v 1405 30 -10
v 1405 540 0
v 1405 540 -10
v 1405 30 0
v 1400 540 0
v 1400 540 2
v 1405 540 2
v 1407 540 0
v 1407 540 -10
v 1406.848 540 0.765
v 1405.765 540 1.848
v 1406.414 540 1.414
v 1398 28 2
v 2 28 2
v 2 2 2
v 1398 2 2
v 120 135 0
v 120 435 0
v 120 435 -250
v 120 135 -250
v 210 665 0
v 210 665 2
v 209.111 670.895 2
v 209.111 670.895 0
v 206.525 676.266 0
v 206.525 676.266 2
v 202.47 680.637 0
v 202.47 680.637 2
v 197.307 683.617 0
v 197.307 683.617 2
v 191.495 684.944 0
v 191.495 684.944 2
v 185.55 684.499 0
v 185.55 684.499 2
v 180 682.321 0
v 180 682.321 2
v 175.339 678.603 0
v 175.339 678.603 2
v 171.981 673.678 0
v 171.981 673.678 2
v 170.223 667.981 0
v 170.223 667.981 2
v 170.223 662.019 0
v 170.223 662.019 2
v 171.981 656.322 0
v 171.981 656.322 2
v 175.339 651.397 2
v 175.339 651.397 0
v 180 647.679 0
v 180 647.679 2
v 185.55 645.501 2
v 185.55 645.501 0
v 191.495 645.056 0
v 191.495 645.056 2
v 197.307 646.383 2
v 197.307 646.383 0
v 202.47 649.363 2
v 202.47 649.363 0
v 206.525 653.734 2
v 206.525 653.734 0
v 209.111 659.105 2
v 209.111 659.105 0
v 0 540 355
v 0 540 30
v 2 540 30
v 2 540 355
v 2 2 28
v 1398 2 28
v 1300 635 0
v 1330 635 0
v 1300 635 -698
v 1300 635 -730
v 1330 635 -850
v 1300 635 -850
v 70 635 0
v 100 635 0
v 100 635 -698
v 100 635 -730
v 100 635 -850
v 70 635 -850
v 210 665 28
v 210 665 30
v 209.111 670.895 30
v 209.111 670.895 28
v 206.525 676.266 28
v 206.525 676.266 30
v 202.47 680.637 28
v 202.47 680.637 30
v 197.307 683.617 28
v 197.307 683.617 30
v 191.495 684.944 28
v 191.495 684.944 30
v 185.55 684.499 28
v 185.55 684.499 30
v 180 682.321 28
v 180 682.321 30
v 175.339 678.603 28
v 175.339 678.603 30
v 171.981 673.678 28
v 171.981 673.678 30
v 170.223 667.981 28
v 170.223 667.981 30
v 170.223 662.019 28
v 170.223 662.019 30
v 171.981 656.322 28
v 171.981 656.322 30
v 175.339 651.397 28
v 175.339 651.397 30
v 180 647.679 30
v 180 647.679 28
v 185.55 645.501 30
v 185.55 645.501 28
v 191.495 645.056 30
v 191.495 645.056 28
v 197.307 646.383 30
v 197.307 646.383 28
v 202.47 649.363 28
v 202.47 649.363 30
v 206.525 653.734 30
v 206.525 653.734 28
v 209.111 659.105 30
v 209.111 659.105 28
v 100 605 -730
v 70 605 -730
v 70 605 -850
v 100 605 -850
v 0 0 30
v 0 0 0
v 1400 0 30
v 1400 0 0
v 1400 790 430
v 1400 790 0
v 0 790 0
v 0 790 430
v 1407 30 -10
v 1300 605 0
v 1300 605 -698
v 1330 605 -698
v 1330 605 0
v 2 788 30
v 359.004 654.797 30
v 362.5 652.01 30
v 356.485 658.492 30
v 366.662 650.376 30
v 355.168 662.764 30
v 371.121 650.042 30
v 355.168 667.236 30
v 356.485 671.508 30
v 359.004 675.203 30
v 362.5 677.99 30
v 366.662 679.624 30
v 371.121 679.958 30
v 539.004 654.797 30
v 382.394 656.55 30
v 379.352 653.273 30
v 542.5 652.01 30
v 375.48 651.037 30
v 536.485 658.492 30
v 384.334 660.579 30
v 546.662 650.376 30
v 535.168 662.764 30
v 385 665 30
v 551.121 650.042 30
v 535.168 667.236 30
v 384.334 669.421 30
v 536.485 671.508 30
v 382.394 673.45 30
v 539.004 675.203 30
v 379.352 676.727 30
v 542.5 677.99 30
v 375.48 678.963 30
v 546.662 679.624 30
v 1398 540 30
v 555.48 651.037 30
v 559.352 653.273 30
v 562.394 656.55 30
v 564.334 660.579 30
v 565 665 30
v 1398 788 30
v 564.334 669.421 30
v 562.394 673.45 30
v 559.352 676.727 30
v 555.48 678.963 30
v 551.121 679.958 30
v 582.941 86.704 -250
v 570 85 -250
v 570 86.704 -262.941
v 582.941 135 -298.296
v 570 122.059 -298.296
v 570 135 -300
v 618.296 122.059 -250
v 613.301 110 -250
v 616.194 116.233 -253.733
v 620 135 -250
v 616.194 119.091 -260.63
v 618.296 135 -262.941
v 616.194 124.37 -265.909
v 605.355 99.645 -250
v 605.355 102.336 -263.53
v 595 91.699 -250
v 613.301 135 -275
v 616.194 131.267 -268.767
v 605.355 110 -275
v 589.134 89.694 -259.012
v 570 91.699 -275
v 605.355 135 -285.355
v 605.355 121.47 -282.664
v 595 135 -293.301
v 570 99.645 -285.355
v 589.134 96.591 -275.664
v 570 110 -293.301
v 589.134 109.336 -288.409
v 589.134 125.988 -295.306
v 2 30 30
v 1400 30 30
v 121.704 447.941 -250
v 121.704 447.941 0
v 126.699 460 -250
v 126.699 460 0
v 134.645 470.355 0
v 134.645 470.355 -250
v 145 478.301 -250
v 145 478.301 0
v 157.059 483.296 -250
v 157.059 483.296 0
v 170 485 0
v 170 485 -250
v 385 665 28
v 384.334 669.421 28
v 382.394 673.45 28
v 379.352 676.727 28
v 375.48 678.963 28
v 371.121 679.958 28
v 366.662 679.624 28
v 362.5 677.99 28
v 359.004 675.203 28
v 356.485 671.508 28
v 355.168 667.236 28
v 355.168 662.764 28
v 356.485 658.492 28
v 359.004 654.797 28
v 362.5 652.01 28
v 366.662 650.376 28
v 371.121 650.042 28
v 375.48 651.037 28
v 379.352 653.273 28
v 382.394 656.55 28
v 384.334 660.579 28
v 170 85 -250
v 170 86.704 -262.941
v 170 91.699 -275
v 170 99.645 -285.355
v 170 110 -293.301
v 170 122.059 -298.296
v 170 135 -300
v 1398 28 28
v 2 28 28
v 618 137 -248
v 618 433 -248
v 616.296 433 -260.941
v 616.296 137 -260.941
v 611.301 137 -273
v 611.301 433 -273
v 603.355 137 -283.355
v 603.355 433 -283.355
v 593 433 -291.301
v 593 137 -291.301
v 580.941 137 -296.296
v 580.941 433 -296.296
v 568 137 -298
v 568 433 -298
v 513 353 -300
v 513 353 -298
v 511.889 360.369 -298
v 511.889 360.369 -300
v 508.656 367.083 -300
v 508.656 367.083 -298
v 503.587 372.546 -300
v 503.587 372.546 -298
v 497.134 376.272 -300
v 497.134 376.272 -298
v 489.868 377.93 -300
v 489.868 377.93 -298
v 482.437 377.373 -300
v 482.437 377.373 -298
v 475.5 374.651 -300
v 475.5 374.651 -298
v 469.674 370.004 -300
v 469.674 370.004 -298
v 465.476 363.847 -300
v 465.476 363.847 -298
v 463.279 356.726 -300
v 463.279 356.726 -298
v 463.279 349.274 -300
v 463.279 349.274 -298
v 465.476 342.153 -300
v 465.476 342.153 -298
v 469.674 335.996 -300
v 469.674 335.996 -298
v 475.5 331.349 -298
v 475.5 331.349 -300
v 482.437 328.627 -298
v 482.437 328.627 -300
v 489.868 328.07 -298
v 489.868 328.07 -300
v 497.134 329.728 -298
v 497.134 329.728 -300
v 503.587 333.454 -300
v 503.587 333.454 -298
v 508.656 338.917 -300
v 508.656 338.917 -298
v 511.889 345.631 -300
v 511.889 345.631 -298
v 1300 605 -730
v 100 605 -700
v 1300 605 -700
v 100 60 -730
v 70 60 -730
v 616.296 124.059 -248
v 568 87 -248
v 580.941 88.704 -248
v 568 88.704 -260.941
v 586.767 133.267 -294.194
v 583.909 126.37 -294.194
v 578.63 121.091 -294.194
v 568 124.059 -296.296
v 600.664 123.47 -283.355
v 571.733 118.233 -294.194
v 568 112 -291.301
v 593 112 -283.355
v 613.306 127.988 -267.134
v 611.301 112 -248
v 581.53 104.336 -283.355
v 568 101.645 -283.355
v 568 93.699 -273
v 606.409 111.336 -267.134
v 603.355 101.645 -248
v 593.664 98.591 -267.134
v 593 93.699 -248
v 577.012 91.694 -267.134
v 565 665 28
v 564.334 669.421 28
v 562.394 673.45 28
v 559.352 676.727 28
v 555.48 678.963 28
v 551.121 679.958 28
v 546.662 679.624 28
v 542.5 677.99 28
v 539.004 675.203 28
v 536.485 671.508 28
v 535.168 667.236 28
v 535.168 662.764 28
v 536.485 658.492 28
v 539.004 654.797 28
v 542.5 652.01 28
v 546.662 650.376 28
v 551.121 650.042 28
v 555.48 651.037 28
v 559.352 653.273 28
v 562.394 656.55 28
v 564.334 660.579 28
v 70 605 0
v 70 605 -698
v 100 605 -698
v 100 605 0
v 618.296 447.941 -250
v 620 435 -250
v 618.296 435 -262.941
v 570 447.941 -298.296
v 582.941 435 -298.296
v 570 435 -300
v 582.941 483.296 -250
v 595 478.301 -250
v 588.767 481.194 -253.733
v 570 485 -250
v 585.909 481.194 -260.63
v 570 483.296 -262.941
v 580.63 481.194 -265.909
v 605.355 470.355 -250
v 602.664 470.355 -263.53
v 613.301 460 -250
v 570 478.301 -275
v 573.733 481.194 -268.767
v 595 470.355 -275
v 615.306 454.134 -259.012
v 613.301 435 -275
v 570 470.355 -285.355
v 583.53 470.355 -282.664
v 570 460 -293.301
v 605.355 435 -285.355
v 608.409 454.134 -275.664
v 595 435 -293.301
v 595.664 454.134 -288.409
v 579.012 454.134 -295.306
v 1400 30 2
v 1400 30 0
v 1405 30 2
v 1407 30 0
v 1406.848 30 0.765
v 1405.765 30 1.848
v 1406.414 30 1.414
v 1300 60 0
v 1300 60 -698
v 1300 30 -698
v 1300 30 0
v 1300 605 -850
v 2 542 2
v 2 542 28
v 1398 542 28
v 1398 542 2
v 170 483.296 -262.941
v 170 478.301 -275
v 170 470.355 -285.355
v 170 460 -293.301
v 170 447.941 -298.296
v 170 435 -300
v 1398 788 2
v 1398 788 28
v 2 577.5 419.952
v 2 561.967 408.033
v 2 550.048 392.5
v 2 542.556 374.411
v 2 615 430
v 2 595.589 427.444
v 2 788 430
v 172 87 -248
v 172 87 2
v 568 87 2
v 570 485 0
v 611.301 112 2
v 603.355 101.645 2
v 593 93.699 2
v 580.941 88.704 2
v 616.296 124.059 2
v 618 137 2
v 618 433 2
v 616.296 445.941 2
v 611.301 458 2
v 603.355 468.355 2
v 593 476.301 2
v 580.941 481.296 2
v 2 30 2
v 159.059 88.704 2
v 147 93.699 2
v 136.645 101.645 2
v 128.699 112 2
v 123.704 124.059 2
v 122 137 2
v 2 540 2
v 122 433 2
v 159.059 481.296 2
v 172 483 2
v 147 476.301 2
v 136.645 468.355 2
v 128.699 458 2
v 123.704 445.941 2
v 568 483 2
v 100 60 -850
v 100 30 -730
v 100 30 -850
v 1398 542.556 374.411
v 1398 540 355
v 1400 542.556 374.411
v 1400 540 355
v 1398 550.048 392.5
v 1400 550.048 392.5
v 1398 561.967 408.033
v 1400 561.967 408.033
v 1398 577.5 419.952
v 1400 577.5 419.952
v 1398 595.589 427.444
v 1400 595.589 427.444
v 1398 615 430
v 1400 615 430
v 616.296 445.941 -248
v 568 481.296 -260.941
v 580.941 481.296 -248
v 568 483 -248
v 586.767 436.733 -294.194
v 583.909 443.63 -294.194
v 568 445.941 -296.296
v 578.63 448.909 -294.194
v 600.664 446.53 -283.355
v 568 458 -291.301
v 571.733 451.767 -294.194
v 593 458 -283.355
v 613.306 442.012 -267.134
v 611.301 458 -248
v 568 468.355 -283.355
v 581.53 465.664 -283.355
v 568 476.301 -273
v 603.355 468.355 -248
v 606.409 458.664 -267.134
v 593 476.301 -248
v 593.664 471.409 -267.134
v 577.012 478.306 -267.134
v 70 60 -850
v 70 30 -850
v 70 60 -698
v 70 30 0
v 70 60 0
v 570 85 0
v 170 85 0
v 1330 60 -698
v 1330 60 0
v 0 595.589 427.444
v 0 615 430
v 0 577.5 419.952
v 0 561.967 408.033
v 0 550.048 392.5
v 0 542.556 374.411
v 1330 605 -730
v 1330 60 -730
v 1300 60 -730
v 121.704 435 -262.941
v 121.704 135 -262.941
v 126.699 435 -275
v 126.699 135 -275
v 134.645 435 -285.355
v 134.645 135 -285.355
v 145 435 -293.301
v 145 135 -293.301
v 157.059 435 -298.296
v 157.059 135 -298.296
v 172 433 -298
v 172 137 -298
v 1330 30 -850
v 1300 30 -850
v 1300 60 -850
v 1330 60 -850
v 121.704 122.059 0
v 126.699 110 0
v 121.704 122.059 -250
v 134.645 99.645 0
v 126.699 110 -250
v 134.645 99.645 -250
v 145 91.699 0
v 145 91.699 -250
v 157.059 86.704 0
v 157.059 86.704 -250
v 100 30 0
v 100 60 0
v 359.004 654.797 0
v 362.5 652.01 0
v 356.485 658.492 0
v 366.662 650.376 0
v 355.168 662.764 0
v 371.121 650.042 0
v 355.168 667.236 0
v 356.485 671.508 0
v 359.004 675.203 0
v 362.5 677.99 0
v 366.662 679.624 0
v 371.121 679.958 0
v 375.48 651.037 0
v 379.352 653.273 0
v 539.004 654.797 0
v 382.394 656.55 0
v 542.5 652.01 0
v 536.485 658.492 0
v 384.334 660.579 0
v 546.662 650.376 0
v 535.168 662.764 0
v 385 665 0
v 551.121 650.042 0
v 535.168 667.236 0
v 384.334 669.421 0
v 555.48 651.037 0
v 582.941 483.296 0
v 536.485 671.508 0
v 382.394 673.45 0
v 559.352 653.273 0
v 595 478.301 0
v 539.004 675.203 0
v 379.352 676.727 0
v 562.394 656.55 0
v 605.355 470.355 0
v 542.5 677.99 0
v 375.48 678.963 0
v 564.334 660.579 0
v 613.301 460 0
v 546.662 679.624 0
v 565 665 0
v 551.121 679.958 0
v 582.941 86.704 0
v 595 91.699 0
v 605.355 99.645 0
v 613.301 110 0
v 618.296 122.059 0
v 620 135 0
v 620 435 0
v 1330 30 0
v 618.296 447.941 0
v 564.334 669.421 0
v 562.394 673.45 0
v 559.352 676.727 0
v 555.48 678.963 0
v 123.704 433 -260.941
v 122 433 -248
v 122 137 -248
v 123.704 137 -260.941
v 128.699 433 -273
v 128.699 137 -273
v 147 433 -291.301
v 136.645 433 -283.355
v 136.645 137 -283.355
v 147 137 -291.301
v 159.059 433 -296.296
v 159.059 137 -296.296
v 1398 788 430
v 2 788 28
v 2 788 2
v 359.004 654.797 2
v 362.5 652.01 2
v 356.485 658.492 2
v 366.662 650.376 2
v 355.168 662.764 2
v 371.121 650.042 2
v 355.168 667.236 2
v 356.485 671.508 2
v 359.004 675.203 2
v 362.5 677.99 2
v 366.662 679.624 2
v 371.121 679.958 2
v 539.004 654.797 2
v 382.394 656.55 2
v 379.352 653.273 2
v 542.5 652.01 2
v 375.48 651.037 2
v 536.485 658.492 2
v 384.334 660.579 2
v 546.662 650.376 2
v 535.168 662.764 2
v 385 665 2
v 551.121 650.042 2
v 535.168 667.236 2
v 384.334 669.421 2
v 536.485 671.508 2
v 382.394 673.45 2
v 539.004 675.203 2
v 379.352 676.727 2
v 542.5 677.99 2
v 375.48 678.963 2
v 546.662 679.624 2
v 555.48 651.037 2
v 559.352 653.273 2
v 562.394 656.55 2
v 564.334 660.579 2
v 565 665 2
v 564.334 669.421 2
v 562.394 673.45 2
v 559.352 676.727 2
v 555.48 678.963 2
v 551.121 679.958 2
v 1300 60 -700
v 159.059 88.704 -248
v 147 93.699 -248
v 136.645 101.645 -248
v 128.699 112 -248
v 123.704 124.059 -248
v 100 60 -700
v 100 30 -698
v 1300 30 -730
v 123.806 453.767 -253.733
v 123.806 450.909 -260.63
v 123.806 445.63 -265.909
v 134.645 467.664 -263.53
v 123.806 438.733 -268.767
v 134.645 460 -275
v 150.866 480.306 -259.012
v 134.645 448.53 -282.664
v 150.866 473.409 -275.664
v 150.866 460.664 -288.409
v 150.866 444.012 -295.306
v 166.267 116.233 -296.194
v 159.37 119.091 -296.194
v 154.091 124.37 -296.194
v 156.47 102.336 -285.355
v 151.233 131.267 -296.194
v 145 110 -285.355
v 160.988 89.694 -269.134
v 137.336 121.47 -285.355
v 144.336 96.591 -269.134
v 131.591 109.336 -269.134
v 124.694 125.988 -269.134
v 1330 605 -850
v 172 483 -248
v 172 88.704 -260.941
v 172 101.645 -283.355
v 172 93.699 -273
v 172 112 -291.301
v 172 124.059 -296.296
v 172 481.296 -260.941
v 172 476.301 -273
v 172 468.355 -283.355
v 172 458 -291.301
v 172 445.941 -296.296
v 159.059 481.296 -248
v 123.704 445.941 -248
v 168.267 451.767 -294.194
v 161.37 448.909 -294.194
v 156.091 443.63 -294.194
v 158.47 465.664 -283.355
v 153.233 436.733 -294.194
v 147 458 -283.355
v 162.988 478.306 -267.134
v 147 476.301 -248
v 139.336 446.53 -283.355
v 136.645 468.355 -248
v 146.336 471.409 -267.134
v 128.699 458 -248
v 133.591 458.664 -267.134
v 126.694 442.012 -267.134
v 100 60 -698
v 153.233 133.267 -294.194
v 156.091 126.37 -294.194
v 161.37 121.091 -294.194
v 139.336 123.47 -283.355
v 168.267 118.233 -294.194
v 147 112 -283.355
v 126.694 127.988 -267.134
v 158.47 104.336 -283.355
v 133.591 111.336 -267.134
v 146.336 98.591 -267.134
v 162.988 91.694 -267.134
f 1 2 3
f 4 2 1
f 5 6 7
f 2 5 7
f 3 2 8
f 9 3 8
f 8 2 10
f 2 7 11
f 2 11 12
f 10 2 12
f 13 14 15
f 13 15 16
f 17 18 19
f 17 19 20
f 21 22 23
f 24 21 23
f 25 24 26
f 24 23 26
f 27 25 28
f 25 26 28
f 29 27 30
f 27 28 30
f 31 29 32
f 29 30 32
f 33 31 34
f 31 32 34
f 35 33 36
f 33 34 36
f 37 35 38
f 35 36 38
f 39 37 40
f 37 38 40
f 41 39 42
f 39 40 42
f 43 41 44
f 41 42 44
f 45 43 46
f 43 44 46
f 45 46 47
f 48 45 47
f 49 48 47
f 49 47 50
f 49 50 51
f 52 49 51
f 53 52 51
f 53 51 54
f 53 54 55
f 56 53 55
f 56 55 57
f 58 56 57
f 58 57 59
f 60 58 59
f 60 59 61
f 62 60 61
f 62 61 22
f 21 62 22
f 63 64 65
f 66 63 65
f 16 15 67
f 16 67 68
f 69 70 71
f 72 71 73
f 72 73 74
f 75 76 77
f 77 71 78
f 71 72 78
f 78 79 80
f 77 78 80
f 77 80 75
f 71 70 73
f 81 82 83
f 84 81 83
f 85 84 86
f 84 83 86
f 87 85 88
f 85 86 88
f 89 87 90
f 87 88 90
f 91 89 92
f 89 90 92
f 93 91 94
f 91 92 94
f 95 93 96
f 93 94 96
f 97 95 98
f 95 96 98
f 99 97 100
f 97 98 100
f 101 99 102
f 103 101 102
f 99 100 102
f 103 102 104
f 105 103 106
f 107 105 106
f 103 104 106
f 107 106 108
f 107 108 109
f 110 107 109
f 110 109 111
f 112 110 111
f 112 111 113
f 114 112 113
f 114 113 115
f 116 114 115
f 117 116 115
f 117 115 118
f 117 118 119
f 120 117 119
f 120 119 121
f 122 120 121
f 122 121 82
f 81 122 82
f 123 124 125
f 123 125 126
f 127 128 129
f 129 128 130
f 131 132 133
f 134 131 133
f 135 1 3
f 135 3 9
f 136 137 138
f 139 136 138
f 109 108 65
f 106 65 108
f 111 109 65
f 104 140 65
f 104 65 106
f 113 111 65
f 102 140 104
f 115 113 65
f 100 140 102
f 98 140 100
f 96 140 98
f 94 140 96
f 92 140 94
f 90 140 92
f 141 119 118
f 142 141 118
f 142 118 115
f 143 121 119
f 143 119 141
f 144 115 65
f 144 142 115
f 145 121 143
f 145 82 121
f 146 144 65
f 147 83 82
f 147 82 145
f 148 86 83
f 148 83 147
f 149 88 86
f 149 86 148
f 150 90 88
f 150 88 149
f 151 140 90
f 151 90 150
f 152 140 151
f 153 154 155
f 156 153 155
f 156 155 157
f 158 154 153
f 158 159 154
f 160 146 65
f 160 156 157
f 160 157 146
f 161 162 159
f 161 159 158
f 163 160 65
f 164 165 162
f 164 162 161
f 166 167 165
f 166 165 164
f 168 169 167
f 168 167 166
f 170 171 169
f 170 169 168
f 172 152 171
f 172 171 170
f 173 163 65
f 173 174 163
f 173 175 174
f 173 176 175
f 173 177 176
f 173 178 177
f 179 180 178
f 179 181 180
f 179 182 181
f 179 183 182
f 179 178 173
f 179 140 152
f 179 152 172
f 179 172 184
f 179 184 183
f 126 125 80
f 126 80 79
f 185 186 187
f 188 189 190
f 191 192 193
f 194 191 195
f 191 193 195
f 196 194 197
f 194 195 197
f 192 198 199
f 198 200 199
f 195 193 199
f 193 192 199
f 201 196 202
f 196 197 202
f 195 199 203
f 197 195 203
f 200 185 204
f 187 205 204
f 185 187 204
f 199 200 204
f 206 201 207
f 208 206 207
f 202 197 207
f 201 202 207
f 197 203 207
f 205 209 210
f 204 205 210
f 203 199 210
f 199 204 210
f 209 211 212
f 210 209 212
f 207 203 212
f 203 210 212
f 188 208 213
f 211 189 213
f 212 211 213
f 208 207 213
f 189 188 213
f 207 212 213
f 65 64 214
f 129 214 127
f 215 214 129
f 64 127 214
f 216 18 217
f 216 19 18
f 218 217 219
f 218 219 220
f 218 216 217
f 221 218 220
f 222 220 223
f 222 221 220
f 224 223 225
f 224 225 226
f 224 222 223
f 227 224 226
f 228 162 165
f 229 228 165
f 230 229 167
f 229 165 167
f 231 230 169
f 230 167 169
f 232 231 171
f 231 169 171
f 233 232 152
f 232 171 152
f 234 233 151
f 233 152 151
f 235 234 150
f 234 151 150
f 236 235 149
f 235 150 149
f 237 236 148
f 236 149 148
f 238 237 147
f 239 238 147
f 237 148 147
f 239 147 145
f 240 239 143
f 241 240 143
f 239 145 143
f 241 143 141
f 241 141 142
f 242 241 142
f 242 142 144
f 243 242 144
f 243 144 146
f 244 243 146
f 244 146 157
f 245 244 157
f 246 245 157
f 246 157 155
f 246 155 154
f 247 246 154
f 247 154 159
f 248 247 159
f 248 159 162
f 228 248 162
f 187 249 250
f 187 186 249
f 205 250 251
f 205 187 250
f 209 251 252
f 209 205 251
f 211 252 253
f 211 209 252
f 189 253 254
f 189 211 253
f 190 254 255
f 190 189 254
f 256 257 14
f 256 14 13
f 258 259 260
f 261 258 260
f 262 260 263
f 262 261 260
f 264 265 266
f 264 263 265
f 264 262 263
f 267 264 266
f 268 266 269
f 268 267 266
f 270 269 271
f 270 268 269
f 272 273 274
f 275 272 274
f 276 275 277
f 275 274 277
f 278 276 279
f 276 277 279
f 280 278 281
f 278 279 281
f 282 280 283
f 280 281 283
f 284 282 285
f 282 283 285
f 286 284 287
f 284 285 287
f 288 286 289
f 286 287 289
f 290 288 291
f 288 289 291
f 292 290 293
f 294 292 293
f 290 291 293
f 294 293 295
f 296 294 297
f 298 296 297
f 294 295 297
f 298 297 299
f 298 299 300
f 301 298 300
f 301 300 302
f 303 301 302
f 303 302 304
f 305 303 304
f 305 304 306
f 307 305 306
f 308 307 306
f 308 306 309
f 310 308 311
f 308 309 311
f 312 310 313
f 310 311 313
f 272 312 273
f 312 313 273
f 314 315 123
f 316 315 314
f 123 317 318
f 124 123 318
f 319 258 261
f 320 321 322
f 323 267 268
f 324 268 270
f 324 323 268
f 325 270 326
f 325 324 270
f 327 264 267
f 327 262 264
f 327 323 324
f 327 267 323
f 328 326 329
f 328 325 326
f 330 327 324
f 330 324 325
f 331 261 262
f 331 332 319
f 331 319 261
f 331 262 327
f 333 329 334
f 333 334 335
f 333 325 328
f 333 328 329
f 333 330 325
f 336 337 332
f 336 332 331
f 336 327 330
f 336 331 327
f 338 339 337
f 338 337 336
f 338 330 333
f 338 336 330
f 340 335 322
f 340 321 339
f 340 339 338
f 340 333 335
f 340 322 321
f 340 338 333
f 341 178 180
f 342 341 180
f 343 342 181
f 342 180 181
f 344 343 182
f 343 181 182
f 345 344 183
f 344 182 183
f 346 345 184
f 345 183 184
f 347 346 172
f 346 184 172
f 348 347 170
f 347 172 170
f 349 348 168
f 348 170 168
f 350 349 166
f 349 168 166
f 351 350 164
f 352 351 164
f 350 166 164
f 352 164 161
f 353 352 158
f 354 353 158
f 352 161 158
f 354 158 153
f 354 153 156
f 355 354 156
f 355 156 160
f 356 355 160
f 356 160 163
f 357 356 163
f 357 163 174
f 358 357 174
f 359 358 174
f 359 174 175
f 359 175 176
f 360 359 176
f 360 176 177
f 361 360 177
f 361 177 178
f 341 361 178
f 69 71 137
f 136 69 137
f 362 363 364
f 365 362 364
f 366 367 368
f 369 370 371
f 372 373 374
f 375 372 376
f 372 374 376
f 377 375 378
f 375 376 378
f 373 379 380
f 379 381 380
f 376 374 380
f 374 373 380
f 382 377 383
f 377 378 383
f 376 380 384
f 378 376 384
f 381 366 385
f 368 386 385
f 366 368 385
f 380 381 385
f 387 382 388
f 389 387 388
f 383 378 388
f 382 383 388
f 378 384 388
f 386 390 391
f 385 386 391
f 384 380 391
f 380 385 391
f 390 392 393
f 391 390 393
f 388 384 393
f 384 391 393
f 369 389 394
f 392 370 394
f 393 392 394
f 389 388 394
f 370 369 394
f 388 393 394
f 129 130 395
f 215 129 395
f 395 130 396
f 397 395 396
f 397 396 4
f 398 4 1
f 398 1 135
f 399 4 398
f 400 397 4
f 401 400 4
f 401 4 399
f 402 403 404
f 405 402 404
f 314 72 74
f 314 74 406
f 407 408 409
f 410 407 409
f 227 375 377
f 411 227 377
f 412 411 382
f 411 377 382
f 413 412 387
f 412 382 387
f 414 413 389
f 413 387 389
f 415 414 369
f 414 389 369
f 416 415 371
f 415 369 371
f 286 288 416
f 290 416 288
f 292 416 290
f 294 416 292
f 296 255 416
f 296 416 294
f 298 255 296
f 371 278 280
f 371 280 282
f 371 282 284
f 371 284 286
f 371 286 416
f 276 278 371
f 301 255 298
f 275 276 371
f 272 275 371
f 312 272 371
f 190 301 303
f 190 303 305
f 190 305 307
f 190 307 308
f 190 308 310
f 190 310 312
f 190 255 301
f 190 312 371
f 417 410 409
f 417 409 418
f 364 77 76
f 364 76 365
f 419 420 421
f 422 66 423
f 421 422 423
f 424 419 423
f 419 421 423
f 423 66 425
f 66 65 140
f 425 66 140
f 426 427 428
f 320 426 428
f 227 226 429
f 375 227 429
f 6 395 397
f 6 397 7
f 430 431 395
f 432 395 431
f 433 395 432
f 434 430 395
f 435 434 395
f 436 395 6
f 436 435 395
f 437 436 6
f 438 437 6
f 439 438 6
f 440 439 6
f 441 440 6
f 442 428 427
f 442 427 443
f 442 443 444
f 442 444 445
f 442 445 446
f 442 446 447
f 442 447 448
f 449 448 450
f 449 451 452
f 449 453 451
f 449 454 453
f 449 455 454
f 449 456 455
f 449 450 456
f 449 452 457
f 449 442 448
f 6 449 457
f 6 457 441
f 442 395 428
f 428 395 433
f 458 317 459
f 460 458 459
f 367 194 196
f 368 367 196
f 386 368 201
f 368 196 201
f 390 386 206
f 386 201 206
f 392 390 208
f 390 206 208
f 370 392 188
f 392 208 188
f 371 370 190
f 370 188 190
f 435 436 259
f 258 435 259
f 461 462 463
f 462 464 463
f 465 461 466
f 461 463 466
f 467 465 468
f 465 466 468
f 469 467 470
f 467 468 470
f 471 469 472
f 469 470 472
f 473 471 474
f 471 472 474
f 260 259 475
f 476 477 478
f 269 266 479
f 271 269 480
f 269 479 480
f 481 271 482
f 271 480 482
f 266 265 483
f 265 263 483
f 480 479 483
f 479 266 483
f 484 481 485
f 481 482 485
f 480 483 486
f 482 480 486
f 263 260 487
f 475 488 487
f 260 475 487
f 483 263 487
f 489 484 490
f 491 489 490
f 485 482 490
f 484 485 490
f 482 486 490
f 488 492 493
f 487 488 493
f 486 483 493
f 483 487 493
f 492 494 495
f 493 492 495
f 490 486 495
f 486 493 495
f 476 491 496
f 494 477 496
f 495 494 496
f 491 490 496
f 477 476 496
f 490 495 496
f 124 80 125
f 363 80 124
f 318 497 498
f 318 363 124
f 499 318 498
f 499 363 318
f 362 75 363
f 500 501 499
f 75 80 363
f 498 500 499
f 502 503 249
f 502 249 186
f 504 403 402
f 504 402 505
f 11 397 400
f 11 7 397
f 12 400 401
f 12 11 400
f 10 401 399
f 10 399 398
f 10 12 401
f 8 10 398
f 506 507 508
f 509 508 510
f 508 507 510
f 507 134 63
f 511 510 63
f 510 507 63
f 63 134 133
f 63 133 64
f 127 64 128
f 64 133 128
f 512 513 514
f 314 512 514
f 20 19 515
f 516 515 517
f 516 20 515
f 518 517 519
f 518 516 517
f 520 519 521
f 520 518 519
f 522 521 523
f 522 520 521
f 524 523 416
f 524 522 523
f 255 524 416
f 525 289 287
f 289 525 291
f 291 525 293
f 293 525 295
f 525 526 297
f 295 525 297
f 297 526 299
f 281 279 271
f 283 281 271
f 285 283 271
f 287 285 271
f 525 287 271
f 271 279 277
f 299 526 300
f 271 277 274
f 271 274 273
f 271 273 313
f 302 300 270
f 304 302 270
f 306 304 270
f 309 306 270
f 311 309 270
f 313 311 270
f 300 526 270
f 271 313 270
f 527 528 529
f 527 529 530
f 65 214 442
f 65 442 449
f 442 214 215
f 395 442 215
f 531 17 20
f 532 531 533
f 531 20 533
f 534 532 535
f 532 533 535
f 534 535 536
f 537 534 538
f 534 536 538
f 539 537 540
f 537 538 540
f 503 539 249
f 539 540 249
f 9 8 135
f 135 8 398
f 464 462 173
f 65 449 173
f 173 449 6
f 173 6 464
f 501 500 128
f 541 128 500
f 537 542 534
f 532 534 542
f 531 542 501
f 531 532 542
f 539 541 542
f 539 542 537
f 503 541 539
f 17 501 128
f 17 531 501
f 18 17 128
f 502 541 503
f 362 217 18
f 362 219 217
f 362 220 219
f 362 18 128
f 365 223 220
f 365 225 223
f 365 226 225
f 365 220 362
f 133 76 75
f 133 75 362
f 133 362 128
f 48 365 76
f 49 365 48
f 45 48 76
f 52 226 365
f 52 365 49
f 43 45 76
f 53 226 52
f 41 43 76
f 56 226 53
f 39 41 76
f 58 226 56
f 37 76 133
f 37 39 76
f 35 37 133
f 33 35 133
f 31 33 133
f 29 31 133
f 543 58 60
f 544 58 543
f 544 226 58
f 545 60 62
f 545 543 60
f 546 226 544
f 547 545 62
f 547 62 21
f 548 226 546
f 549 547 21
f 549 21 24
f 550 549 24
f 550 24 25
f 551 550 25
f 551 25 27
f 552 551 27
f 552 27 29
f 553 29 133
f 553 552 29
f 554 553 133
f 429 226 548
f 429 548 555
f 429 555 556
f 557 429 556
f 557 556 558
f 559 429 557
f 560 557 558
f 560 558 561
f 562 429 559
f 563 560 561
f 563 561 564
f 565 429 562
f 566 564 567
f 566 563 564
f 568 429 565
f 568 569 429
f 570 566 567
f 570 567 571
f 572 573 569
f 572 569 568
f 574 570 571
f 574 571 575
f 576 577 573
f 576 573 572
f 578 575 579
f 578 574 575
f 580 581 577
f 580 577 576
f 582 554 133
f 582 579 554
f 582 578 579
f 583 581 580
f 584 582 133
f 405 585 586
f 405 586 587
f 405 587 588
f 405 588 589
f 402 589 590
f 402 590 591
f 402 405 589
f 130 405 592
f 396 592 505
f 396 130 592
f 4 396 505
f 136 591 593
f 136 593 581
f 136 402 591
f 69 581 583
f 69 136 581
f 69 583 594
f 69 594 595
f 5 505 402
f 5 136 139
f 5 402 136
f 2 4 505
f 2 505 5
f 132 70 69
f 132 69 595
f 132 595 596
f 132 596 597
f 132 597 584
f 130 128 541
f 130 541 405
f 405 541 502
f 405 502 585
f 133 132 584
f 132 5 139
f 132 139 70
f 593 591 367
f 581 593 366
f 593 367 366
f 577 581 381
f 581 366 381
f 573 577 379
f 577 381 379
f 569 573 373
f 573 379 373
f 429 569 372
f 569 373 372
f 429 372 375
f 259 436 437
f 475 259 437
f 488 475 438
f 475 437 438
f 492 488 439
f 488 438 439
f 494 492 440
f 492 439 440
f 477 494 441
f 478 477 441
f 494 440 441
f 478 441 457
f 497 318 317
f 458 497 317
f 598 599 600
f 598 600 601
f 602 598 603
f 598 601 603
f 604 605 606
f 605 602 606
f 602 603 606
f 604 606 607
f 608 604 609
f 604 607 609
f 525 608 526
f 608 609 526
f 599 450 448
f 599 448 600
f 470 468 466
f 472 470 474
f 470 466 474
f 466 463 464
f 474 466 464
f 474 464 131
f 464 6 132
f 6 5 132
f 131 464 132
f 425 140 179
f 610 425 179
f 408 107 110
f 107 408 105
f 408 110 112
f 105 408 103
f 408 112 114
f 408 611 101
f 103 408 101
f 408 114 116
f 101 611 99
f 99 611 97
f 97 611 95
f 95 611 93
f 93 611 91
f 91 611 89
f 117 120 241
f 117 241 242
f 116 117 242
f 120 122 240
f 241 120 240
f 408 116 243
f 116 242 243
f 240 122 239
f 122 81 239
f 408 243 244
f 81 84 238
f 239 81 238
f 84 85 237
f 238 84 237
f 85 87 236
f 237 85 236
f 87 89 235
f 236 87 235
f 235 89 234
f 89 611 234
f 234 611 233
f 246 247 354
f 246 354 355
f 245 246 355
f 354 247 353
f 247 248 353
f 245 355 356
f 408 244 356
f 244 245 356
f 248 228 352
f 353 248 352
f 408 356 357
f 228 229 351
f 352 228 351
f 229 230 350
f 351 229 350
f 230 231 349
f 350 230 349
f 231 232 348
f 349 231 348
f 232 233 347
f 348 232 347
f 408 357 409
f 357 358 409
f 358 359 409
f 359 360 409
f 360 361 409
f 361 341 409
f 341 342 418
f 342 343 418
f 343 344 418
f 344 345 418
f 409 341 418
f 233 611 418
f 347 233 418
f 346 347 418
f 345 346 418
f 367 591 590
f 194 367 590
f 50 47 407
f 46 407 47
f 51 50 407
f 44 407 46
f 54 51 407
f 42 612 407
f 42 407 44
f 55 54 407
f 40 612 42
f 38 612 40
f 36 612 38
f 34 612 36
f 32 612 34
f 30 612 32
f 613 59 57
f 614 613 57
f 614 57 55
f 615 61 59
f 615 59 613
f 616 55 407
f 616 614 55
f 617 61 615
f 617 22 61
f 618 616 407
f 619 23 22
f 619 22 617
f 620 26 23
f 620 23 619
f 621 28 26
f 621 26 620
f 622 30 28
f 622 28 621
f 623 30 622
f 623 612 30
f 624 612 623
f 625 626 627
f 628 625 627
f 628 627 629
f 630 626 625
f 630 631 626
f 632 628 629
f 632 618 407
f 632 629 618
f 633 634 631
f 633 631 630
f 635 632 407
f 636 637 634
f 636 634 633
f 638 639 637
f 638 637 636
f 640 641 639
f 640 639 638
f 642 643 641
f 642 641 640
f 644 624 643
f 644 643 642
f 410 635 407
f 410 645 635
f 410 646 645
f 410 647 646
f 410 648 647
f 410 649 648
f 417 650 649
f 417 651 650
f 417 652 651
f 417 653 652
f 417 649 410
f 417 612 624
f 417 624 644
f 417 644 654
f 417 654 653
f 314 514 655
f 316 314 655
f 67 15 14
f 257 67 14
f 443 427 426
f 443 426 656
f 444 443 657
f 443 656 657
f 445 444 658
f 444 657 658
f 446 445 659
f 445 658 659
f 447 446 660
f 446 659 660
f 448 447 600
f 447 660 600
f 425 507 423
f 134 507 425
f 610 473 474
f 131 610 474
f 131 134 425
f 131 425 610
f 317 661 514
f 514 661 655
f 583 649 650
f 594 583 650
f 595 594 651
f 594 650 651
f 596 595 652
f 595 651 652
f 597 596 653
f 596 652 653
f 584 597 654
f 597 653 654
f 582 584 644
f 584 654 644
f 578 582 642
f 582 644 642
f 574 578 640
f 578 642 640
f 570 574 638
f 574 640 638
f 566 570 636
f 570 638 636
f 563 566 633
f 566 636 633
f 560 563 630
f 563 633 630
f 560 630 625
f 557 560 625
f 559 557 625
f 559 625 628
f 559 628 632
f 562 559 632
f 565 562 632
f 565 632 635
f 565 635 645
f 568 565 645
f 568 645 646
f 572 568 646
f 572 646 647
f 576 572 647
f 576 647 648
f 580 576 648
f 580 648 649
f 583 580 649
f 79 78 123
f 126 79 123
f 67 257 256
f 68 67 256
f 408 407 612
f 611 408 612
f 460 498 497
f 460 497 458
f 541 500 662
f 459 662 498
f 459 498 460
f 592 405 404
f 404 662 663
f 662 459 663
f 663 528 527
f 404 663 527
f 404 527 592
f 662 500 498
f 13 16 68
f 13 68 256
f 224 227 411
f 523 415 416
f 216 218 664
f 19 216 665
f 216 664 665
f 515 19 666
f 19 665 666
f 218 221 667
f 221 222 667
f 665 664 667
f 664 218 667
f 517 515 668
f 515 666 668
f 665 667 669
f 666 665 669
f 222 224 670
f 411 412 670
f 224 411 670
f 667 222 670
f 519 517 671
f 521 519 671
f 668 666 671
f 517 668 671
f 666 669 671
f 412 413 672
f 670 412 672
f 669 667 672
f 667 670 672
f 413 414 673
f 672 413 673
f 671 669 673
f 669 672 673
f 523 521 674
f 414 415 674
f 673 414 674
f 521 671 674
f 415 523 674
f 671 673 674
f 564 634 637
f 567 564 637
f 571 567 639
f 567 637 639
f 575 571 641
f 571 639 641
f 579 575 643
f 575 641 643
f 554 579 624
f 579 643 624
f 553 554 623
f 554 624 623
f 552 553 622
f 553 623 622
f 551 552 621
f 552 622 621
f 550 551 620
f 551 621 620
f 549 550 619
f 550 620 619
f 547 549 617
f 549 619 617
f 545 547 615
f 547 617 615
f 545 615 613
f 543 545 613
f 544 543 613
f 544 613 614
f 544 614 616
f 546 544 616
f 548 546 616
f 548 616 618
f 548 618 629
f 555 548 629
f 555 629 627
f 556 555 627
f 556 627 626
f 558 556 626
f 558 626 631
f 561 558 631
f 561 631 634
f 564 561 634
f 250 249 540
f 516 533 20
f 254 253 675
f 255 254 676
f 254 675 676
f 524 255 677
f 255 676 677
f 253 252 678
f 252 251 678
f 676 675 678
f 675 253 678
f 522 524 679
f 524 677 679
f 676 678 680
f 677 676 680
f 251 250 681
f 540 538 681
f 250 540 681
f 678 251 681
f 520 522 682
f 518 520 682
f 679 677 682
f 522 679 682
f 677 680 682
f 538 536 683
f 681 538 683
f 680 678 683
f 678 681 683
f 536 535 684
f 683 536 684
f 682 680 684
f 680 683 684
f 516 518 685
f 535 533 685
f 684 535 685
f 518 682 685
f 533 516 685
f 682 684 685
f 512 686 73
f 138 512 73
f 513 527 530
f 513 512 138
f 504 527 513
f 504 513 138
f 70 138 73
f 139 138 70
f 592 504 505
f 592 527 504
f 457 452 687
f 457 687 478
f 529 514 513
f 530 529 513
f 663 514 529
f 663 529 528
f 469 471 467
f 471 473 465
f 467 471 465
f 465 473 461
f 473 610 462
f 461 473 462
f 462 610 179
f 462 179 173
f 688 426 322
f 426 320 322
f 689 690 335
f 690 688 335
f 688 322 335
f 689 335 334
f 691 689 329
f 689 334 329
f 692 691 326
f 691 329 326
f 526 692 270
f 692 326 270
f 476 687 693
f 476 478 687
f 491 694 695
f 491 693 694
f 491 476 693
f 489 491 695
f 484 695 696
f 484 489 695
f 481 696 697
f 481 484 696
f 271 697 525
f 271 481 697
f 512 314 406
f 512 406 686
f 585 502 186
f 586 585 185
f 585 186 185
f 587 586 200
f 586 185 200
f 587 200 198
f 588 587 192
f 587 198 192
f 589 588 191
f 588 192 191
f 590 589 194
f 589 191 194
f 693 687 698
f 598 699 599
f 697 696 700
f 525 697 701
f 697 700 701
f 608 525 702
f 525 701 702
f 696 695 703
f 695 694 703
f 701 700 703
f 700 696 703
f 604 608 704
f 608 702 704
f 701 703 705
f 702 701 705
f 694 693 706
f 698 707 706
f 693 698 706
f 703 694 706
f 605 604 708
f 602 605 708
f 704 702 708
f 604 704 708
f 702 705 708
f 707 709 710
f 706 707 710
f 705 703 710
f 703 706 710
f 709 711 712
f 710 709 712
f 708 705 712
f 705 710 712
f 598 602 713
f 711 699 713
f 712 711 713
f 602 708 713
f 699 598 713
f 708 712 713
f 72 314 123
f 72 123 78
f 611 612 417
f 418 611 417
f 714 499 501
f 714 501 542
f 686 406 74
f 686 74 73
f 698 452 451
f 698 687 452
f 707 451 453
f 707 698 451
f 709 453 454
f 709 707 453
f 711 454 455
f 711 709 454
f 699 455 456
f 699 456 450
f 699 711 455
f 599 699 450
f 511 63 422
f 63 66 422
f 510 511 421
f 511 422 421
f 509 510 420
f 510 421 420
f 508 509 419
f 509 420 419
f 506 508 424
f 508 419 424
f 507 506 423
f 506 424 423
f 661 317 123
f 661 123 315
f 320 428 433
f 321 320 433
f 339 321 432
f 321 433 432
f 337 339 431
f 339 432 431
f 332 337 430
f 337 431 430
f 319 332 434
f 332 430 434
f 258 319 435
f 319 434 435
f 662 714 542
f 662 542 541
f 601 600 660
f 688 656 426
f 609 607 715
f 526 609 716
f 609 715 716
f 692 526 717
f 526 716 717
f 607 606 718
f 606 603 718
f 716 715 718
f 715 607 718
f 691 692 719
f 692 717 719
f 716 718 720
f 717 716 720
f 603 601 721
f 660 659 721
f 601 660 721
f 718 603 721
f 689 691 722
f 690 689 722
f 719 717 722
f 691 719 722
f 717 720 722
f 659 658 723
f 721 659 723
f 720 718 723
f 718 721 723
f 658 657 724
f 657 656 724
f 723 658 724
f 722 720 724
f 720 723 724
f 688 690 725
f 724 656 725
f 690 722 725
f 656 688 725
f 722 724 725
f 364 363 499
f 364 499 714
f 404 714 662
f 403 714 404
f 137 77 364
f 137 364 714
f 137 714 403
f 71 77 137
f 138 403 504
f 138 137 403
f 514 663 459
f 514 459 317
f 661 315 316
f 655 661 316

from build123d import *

# Parameters (mm, degrees)
F0_W        = 1400
F0_H        = 790
F1_DEPTH    = 30
F2_W        = 1398
F2_H        = 510
F3_DEPTH    = 28
F4_W        = 500
F4_H        = 400
F5_DEPTH    = 300
F6_T        = 2
F6_T3_DEPTH = 404
F6_T5_DEPTH = 504
F6_T7_DEPTH = 32
F7_R        = 50
F8_R        = 25
F9_DEPTH    = 2
F10_R       = 15
F10_R_2     = 20
F11_DEPTH   = 30
F12_W       = 510
F12_H       = 2
F13_DEPTH   = 5
F14_W       = 510
F14_H       = 2
F15_ANGLE   = 90
F16_W       = 2
F16_H       = 510
F17_DEPTH   = 10
F18_W       = 30
F18_H       = 30
F19_DEPTH   = 850
F20_W       = 30
F20_H       = 30
F21_DEPTH   = 1200
F22_W       = 30
F22_H       = 30
F23_DEPTH   = 545
F25_DEPTH   = 2
F27_DEPTH   = 400
F28_R       = 75


# Not quite as in the source:
# - a shell that OpenCascade refuses in one call is made with other operations: the cavity is built on its own and cut out


with BuildPart() as f1:
    # F0 (on Top) → F1 (new body)
    with BuildSketch(Plane.XY):
        with Locations((700, 395)):
            Rectangle(F0_W, F0_H)
    extrude(amount=F1_DEPTH)

    # F2 (on face) → F3 (cut)
    with BuildSketch(Plane.XY.offset(30)):
        with Locations((701, 285)):
            Rectangle(F2_W, F2_H)
    extrude(amount=-F3_DEPTH, mode=Mode.SUBTRACT)

    # F4 (on face) → F5 (join)
    with BuildSketch(Plane(origin=(0, 0, 0), x_dir=(1, 0, 0), z_dir=(0, 0, -1))):
        with Locations((370, -285)):
            Rectangle(F4_W, F4_H)
    extrude(amount=F5_DEPTH)

    # F6: shell of thickness 2, made by hand


with BuildPart() as f6_core1:
    # F6_t2: copy of F1
    add(f1.part)

    # the walls: a layer under each face that stays
    f6_faces = [f6_core1.faces().sort_by_distance(p)[0] for p in [
        (0, 395, 15),
        (700, 790, 15),
        (700, 0, 15),
        (700, 395, 0),
        (233.3333333333, 658.3333333333, 30),
        (1400, 658.3333333333, 25),
        (620, 285, -150),
        (370, 485, -150),
        (120, 285, -150),
        (370, 85, -150),
        (701, 540, 16),
        (2, 285, 16),
        (701, 30, 16),
        (370, 285, -300),
    ]]
    thicken(f6_faces, amount=-F6_T, mode=Mode.SUBTRACT)

    # F6_s4 → F6_t3 (cut)
    with BuildSketch(Plane.XZ.offset(-487)):
        Polygon((620.02, -0.02), (620, 2), (618, 2), (618, 0), align=None)
        Polygon((119.98, -0.02), (120, 2), (122, 2), (122, 0), align=None)
    extrude(amount=F6_T3_DEPTH, mode=Mode.SUBTRACT)

    # F6_s6 → F6_t5 (cut)
    with BuildSketch(Plane.YZ.offset(118)):
        Polygon((485.02, -0.02), (485, 2), (483, 2), (483, 0), align=None)
        Polygon((84.98, -0.02), (85, 2), (87, 2), (87, 0), align=None)
    extrude(amount=F6_T5_DEPTH, mode=Mode.SUBTRACT)

    # F6_s8 → F6_t7 (cut)
    with BuildSketch(Plane.XY):
        Polygon((2.02, 539.98), (2, 542), (0, 542), (0, 540), align=None)
        Polygon((2.02, 30.02), (0, 30), (0, 28), (2, 28), align=None)
    extrude(amount=F6_T7_DEPTH, mode=Mode.SUBTRACT)


with BuildPart() as f1_1:
    add(f1.part)

    # what is left inside the walls is the cavity
    f6_cavity = [f6_core1.part.solids().sort_by_distance(p)[0] for p in [
        (700, 10.666667, 2.02),
        (700, 624, 27.98),
        (370, 351, -297.98),
    ]]
    add(f6_cavity, mode=Mode.SUBTRACT)

    # F7
    f7_edges = [f1_1.edges().sort_by_distance(p)[0] for p in [
        (122, 483, -148),
        (618, 483, -148),
        (122, 87, -148),
        (618, 87, -148),
        (618, 285, -298),
        (370, 483, -298),
        (122, 285, -298),
        (370, 87, -298),
        (120, 85, -150),
        (370, 85, -300),
        (620, 85, -150),
        (620, 285, -300),
        (620, 485, -150),
        (370, 485, -300),
        (120, 485, -150),
        (120, 285, -300),
    ]]
    fillet(f7_edges, radius=F7_R)

    # F8 (on face) → F9 (cut, through all)
    with BuildSketch(Plane.XY.offset(-298)):
        with Locations((488, 353)):
            Circle(F8_R)
    extrude(amount=-F9_DEPTH, mode=Mode.SUBTRACT)

    # F10 (on face) → F11 (cut, through all)
    with BuildSketch(Plane.XY.offset(30)):
        with Locations((550, 665)):
            Circle(F10_R)
        with Locations((370, 665)):
            Circle(F10_R)
        with Locations((190, 665)):
            Circle(F10_R_2)
    extrude(amount=-F11_DEPTH, mode=Mode.SUBTRACT)

    # F12 (on face) → F13 (join)
    with BuildSketch(Plane.YZ.offset(1400)):
        with Locations((285, 1)):
            Rectangle(F12_W, F12_H)
    extrude(amount=F13_DEPTH)

    # F14 (on face) → F15 (revolve)
    with BuildSketch(Plane.YZ.offset(1405)):
        with Locations((285, 1)):
            Rectangle(F14_W, F14_H)
    revolve(axis=Axis((1405, 285, 0), (0, 1, 0)), revolution_arc=F15_ANGLE)

    # F16 (on face) → F17 (join)
    with BuildSketch(Plane(origin=(0, 0, 0), x_dir=(1, 0, 0), z_dir=(0, 0, -1))):
        with Locations((1406, -285)):
            Rectangle(F16_W, F16_H)
    extrude(amount=F17_DEPTH)

    # F18 (on face) → F19 (join)
    with BuildSketch(Plane(origin=(0, 0, 0), x_dir=(1, 0, 0), z_dir=(0, 0, -1))):
        with Locations((85, -45)):
            Rectangle(F18_W, F18_H)
        with Locations((1315, -45)):
            Rectangle(F18_W, F18_H)
        with Locations((1315, -620)):
            Rectangle(F18_W, F18_H)
        with Locations((85, -620)):
            Rectangle(F18_W, F18_H)
    extrude(amount=F19_DEPTH)

    # F20 (on face) → F21 (join, through all)
    with BuildSketch(Plane.YZ.offset(100)):
        with Locations((45, -715)):
            Rectangle(F20_W, F20_H)
        with Locations((620, -715)):
            Rectangle(F20_W, F20_H)
    extrude(amount=F21_DEPTH)

    # F22 (on face) → F23 (join, through all)
    with BuildSketch(Plane(origin=(0, 60, 0), x_dir=(-1, 0, 0), z_dir=(0, 1, 0))):
        with Locations((-1315, -715)):
            Rectangle(F22_W, F22_H)
        with Locations((-85, -715)):
            Rectangle(F22_W, F22_H)
    extrude(amount=F23_DEPTH)

    # F24 (on face) → F25 (join)
    with BuildSketch(Plane.XY.offset(-700)):
        Polygon((100, 60), (100, 30), (1300, 30), (1300, 60), (1330, 60), (1330, 605), (1300, 605), (1300, 635), (100, 635), (100, 605), (70, 605), (70, 60), align=None)
    extrude(amount=F25_DEPTH)

    # F26 (on face) → F27 (join)
    with BuildSketch(Plane.XY.offset(30)):
        Polygon((1400, 790), (0, 790), (0, 540), (2, 540), (2, 788), (1398, 788), (1398, 540), (1400, 540), align=None)
    extrude(amount=F27_DEPTH)

    # F28
    f28_edges = [f1_1.edges().sort_by_distance(p)[0] for p in [
        (1, 540, 430),
        (1399, 540, 430),
    ]]
    fillet(f28_edges, radius=F28_R)


solid = f1_1.part
